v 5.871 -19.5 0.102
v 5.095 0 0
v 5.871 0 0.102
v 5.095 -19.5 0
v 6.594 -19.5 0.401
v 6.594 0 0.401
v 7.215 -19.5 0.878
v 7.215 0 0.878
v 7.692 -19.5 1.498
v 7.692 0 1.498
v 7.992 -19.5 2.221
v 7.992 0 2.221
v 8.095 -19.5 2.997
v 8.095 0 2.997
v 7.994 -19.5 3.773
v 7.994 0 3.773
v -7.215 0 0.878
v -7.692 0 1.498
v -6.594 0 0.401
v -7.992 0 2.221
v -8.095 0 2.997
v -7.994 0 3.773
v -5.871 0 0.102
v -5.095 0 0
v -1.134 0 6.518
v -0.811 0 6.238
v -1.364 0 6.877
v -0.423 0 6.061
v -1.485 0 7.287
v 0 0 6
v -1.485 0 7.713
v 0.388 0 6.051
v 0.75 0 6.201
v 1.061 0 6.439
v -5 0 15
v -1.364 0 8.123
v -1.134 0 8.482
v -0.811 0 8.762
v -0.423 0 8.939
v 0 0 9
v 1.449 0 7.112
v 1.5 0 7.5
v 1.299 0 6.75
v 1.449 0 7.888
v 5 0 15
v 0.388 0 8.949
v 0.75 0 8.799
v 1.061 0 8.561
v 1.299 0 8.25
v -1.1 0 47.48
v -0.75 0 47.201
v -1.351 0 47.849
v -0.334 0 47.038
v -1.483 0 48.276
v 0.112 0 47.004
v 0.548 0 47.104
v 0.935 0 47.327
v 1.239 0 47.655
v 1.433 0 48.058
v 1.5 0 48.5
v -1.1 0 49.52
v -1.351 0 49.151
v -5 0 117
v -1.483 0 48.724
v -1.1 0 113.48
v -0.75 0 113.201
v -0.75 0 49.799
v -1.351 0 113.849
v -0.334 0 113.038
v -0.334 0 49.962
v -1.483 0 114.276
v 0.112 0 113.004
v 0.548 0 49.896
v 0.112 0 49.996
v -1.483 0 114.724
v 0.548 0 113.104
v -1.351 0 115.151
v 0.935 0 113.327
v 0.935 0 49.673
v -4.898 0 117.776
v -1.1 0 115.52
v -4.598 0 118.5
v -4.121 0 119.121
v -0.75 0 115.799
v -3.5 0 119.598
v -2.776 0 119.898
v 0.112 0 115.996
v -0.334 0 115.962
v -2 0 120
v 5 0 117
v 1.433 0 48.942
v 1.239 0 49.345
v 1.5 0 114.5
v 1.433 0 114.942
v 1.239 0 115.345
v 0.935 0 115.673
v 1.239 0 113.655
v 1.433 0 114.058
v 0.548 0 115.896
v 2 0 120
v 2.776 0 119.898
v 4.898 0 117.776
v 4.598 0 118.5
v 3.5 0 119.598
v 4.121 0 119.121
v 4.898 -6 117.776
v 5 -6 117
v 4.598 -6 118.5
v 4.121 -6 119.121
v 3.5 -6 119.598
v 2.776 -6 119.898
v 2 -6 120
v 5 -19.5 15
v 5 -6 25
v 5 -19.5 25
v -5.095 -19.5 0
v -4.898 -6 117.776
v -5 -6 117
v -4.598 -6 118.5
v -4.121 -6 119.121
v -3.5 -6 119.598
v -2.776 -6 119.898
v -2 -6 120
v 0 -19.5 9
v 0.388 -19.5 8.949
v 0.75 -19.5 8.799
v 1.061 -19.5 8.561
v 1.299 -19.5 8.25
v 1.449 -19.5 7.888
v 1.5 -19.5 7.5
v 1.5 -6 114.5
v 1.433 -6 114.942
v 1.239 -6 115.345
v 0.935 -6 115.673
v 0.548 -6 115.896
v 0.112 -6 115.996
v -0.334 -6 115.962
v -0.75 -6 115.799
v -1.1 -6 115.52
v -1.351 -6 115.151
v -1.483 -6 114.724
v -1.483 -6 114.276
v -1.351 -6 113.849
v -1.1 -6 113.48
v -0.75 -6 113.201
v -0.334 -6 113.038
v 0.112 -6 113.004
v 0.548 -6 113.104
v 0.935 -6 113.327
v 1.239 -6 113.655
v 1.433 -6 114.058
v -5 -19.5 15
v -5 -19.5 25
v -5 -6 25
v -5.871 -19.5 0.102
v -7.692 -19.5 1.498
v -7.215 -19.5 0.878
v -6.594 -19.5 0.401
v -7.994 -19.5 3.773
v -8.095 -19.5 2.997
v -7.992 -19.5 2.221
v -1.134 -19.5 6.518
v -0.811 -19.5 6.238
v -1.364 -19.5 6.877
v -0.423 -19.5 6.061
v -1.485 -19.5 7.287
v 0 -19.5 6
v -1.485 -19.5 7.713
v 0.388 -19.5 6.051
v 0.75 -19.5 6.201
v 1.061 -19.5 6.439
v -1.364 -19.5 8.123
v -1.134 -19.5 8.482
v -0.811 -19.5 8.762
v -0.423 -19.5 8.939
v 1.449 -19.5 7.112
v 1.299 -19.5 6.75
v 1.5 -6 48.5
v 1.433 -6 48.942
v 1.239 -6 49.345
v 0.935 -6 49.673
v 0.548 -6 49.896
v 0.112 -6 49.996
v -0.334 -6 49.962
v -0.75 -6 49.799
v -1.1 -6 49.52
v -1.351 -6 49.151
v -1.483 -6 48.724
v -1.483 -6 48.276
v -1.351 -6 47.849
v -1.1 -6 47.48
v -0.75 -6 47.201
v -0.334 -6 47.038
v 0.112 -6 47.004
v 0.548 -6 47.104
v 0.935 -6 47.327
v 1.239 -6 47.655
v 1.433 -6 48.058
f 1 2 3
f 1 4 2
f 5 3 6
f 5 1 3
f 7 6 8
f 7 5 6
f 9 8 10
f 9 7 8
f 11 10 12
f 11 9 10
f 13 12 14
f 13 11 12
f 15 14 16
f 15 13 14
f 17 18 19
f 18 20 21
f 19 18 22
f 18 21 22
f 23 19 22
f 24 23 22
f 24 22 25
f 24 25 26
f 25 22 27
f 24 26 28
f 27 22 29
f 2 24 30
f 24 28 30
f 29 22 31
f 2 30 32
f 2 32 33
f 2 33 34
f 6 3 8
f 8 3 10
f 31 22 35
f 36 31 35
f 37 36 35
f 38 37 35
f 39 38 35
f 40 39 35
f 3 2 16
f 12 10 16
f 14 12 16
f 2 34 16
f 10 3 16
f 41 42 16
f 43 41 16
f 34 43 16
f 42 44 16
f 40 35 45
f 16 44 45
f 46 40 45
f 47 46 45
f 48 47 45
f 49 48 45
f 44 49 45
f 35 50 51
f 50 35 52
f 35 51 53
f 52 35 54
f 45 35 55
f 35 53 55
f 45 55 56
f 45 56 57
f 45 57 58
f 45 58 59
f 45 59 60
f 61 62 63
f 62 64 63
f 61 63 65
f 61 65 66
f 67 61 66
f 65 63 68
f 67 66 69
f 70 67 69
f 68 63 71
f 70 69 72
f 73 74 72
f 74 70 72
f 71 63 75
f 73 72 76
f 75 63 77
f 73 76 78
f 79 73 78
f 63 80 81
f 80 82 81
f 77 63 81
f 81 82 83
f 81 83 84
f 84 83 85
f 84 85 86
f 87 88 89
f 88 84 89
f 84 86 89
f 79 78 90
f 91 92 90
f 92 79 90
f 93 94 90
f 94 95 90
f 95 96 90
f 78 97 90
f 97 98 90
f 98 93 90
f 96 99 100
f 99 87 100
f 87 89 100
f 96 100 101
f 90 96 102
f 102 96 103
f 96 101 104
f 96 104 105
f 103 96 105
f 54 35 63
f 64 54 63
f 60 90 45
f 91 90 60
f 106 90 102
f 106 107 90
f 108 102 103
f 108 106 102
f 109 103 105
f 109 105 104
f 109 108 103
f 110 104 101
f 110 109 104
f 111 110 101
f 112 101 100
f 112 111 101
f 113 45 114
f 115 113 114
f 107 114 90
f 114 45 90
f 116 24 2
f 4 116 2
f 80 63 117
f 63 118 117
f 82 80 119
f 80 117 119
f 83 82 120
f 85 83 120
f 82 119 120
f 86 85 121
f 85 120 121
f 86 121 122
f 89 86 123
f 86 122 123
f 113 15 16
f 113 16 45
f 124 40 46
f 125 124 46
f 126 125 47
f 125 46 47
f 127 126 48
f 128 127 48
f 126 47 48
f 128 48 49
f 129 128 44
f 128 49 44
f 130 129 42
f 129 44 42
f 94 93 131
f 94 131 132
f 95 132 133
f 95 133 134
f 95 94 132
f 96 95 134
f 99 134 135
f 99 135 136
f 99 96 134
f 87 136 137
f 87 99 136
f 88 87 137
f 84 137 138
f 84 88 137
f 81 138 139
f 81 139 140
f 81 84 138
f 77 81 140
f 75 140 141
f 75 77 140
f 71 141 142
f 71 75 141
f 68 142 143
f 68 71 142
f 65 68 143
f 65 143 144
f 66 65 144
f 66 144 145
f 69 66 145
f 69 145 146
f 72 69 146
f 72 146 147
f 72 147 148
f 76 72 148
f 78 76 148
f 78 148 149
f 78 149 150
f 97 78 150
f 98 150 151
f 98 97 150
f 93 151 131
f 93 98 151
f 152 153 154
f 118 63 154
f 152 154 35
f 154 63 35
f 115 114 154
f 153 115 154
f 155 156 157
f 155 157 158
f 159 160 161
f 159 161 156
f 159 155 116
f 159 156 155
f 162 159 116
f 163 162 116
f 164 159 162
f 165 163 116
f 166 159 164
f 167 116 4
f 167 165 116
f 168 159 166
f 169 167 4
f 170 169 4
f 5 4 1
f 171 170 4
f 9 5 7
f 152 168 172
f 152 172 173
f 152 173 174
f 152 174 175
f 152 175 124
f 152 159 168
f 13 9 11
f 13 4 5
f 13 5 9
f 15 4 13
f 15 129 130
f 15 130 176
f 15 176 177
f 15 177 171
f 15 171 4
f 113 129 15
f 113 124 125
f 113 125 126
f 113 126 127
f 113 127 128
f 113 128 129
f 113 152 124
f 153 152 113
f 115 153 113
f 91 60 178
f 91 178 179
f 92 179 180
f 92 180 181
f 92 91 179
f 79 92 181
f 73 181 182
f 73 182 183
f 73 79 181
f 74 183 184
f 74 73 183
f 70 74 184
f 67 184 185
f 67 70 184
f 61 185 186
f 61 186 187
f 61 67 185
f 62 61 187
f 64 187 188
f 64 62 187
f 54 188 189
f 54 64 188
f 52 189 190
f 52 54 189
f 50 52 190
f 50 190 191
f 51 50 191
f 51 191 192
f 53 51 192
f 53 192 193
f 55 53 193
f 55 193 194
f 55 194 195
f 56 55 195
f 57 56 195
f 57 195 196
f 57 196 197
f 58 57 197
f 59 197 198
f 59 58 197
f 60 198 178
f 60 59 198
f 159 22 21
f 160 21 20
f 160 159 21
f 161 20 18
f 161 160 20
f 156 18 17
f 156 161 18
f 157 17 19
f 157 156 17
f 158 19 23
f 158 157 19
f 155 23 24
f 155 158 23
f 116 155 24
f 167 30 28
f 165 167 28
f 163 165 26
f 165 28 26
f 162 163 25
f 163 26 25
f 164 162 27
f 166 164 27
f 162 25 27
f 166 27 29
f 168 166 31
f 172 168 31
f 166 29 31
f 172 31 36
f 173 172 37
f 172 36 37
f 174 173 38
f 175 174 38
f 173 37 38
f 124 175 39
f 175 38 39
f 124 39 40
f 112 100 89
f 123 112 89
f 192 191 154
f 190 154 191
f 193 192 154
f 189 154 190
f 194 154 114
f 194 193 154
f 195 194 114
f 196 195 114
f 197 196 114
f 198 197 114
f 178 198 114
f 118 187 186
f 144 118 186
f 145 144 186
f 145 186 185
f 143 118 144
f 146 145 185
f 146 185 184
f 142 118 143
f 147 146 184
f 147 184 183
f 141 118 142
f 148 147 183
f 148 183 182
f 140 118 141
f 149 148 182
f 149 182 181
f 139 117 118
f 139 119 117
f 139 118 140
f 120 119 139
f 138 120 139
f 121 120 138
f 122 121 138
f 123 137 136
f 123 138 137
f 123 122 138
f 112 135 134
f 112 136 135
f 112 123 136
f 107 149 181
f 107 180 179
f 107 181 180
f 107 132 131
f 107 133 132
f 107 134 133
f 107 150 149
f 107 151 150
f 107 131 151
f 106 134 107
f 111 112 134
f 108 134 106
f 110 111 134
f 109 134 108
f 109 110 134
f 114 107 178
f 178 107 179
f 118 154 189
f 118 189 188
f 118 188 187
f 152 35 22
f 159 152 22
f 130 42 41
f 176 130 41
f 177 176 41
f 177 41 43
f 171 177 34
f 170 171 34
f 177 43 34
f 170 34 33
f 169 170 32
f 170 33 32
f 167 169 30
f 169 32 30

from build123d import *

# Parameters (mm, degrees)
F1_DEPTH = 19.5
F0_R     = 1.5
F2_DEPTH = 6
F3_R     = 3


with BuildPart() as f1:
    # F0 (on Front) → F1 (new body)
    with BuildSketch(Plane.XZ):
        with BuildLine():
            Line((-9, 0), (0, 0))
            Line((0, 0), (0, 6))
            ThreePointArc((0, 6), (-1.5, 7.5), (0, 9))
            Line((0, 9), (0, 25))
            Line((0, 25), (-5, 25))
            Line((-5, 25), (-5, 15))
            Line((-5, 15), (-9, 0))
        make_face()
        with BuildLine():
            Line((0, 6), (0, 0))
            Line((0, 0), (9, 0))
            Line((9, 0), (5, 15))
            Line((5, 15), (5, 25))
            Line((5, 25), (0, 25))
            Line((0, 25), (0, 9))
            ThreePointArc((0, 9), (1.06066, 8.56066), (1.5, 7.5))
            ThreePointArc((1.5, 7.5), (1.06066, 6.43934), (0, 6))
        make_face()
    extrude(amount=F1_DEPTH)

    # F0 (on Front) → F2 (join)
    with BuildSketch(Plane.XZ):
        Polygon((0, 25), (5, 25), (5, 120), (-5, 120), (-5, 25), align=None)
        with Locations((0, 48.5)):
            Circle(F0_R, mode=Mode.SUBTRACT)
        with Locations((0, 114.5)):
            Circle(F0_R, mode=Mode.SUBTRACT)
    extrude(amount=F2_DEPTH)

    # F3
    f3_edges = [f1.edges().sort_by_distance(p)[0] for p in [
        (5, -3, 120),
        (-5, -3, 120),
        (9, -9.75, 0),
        (-9, -9.75, 0),
    ]]
    fillet(f3_edges, radius=F3_R)


solid = f1.part
